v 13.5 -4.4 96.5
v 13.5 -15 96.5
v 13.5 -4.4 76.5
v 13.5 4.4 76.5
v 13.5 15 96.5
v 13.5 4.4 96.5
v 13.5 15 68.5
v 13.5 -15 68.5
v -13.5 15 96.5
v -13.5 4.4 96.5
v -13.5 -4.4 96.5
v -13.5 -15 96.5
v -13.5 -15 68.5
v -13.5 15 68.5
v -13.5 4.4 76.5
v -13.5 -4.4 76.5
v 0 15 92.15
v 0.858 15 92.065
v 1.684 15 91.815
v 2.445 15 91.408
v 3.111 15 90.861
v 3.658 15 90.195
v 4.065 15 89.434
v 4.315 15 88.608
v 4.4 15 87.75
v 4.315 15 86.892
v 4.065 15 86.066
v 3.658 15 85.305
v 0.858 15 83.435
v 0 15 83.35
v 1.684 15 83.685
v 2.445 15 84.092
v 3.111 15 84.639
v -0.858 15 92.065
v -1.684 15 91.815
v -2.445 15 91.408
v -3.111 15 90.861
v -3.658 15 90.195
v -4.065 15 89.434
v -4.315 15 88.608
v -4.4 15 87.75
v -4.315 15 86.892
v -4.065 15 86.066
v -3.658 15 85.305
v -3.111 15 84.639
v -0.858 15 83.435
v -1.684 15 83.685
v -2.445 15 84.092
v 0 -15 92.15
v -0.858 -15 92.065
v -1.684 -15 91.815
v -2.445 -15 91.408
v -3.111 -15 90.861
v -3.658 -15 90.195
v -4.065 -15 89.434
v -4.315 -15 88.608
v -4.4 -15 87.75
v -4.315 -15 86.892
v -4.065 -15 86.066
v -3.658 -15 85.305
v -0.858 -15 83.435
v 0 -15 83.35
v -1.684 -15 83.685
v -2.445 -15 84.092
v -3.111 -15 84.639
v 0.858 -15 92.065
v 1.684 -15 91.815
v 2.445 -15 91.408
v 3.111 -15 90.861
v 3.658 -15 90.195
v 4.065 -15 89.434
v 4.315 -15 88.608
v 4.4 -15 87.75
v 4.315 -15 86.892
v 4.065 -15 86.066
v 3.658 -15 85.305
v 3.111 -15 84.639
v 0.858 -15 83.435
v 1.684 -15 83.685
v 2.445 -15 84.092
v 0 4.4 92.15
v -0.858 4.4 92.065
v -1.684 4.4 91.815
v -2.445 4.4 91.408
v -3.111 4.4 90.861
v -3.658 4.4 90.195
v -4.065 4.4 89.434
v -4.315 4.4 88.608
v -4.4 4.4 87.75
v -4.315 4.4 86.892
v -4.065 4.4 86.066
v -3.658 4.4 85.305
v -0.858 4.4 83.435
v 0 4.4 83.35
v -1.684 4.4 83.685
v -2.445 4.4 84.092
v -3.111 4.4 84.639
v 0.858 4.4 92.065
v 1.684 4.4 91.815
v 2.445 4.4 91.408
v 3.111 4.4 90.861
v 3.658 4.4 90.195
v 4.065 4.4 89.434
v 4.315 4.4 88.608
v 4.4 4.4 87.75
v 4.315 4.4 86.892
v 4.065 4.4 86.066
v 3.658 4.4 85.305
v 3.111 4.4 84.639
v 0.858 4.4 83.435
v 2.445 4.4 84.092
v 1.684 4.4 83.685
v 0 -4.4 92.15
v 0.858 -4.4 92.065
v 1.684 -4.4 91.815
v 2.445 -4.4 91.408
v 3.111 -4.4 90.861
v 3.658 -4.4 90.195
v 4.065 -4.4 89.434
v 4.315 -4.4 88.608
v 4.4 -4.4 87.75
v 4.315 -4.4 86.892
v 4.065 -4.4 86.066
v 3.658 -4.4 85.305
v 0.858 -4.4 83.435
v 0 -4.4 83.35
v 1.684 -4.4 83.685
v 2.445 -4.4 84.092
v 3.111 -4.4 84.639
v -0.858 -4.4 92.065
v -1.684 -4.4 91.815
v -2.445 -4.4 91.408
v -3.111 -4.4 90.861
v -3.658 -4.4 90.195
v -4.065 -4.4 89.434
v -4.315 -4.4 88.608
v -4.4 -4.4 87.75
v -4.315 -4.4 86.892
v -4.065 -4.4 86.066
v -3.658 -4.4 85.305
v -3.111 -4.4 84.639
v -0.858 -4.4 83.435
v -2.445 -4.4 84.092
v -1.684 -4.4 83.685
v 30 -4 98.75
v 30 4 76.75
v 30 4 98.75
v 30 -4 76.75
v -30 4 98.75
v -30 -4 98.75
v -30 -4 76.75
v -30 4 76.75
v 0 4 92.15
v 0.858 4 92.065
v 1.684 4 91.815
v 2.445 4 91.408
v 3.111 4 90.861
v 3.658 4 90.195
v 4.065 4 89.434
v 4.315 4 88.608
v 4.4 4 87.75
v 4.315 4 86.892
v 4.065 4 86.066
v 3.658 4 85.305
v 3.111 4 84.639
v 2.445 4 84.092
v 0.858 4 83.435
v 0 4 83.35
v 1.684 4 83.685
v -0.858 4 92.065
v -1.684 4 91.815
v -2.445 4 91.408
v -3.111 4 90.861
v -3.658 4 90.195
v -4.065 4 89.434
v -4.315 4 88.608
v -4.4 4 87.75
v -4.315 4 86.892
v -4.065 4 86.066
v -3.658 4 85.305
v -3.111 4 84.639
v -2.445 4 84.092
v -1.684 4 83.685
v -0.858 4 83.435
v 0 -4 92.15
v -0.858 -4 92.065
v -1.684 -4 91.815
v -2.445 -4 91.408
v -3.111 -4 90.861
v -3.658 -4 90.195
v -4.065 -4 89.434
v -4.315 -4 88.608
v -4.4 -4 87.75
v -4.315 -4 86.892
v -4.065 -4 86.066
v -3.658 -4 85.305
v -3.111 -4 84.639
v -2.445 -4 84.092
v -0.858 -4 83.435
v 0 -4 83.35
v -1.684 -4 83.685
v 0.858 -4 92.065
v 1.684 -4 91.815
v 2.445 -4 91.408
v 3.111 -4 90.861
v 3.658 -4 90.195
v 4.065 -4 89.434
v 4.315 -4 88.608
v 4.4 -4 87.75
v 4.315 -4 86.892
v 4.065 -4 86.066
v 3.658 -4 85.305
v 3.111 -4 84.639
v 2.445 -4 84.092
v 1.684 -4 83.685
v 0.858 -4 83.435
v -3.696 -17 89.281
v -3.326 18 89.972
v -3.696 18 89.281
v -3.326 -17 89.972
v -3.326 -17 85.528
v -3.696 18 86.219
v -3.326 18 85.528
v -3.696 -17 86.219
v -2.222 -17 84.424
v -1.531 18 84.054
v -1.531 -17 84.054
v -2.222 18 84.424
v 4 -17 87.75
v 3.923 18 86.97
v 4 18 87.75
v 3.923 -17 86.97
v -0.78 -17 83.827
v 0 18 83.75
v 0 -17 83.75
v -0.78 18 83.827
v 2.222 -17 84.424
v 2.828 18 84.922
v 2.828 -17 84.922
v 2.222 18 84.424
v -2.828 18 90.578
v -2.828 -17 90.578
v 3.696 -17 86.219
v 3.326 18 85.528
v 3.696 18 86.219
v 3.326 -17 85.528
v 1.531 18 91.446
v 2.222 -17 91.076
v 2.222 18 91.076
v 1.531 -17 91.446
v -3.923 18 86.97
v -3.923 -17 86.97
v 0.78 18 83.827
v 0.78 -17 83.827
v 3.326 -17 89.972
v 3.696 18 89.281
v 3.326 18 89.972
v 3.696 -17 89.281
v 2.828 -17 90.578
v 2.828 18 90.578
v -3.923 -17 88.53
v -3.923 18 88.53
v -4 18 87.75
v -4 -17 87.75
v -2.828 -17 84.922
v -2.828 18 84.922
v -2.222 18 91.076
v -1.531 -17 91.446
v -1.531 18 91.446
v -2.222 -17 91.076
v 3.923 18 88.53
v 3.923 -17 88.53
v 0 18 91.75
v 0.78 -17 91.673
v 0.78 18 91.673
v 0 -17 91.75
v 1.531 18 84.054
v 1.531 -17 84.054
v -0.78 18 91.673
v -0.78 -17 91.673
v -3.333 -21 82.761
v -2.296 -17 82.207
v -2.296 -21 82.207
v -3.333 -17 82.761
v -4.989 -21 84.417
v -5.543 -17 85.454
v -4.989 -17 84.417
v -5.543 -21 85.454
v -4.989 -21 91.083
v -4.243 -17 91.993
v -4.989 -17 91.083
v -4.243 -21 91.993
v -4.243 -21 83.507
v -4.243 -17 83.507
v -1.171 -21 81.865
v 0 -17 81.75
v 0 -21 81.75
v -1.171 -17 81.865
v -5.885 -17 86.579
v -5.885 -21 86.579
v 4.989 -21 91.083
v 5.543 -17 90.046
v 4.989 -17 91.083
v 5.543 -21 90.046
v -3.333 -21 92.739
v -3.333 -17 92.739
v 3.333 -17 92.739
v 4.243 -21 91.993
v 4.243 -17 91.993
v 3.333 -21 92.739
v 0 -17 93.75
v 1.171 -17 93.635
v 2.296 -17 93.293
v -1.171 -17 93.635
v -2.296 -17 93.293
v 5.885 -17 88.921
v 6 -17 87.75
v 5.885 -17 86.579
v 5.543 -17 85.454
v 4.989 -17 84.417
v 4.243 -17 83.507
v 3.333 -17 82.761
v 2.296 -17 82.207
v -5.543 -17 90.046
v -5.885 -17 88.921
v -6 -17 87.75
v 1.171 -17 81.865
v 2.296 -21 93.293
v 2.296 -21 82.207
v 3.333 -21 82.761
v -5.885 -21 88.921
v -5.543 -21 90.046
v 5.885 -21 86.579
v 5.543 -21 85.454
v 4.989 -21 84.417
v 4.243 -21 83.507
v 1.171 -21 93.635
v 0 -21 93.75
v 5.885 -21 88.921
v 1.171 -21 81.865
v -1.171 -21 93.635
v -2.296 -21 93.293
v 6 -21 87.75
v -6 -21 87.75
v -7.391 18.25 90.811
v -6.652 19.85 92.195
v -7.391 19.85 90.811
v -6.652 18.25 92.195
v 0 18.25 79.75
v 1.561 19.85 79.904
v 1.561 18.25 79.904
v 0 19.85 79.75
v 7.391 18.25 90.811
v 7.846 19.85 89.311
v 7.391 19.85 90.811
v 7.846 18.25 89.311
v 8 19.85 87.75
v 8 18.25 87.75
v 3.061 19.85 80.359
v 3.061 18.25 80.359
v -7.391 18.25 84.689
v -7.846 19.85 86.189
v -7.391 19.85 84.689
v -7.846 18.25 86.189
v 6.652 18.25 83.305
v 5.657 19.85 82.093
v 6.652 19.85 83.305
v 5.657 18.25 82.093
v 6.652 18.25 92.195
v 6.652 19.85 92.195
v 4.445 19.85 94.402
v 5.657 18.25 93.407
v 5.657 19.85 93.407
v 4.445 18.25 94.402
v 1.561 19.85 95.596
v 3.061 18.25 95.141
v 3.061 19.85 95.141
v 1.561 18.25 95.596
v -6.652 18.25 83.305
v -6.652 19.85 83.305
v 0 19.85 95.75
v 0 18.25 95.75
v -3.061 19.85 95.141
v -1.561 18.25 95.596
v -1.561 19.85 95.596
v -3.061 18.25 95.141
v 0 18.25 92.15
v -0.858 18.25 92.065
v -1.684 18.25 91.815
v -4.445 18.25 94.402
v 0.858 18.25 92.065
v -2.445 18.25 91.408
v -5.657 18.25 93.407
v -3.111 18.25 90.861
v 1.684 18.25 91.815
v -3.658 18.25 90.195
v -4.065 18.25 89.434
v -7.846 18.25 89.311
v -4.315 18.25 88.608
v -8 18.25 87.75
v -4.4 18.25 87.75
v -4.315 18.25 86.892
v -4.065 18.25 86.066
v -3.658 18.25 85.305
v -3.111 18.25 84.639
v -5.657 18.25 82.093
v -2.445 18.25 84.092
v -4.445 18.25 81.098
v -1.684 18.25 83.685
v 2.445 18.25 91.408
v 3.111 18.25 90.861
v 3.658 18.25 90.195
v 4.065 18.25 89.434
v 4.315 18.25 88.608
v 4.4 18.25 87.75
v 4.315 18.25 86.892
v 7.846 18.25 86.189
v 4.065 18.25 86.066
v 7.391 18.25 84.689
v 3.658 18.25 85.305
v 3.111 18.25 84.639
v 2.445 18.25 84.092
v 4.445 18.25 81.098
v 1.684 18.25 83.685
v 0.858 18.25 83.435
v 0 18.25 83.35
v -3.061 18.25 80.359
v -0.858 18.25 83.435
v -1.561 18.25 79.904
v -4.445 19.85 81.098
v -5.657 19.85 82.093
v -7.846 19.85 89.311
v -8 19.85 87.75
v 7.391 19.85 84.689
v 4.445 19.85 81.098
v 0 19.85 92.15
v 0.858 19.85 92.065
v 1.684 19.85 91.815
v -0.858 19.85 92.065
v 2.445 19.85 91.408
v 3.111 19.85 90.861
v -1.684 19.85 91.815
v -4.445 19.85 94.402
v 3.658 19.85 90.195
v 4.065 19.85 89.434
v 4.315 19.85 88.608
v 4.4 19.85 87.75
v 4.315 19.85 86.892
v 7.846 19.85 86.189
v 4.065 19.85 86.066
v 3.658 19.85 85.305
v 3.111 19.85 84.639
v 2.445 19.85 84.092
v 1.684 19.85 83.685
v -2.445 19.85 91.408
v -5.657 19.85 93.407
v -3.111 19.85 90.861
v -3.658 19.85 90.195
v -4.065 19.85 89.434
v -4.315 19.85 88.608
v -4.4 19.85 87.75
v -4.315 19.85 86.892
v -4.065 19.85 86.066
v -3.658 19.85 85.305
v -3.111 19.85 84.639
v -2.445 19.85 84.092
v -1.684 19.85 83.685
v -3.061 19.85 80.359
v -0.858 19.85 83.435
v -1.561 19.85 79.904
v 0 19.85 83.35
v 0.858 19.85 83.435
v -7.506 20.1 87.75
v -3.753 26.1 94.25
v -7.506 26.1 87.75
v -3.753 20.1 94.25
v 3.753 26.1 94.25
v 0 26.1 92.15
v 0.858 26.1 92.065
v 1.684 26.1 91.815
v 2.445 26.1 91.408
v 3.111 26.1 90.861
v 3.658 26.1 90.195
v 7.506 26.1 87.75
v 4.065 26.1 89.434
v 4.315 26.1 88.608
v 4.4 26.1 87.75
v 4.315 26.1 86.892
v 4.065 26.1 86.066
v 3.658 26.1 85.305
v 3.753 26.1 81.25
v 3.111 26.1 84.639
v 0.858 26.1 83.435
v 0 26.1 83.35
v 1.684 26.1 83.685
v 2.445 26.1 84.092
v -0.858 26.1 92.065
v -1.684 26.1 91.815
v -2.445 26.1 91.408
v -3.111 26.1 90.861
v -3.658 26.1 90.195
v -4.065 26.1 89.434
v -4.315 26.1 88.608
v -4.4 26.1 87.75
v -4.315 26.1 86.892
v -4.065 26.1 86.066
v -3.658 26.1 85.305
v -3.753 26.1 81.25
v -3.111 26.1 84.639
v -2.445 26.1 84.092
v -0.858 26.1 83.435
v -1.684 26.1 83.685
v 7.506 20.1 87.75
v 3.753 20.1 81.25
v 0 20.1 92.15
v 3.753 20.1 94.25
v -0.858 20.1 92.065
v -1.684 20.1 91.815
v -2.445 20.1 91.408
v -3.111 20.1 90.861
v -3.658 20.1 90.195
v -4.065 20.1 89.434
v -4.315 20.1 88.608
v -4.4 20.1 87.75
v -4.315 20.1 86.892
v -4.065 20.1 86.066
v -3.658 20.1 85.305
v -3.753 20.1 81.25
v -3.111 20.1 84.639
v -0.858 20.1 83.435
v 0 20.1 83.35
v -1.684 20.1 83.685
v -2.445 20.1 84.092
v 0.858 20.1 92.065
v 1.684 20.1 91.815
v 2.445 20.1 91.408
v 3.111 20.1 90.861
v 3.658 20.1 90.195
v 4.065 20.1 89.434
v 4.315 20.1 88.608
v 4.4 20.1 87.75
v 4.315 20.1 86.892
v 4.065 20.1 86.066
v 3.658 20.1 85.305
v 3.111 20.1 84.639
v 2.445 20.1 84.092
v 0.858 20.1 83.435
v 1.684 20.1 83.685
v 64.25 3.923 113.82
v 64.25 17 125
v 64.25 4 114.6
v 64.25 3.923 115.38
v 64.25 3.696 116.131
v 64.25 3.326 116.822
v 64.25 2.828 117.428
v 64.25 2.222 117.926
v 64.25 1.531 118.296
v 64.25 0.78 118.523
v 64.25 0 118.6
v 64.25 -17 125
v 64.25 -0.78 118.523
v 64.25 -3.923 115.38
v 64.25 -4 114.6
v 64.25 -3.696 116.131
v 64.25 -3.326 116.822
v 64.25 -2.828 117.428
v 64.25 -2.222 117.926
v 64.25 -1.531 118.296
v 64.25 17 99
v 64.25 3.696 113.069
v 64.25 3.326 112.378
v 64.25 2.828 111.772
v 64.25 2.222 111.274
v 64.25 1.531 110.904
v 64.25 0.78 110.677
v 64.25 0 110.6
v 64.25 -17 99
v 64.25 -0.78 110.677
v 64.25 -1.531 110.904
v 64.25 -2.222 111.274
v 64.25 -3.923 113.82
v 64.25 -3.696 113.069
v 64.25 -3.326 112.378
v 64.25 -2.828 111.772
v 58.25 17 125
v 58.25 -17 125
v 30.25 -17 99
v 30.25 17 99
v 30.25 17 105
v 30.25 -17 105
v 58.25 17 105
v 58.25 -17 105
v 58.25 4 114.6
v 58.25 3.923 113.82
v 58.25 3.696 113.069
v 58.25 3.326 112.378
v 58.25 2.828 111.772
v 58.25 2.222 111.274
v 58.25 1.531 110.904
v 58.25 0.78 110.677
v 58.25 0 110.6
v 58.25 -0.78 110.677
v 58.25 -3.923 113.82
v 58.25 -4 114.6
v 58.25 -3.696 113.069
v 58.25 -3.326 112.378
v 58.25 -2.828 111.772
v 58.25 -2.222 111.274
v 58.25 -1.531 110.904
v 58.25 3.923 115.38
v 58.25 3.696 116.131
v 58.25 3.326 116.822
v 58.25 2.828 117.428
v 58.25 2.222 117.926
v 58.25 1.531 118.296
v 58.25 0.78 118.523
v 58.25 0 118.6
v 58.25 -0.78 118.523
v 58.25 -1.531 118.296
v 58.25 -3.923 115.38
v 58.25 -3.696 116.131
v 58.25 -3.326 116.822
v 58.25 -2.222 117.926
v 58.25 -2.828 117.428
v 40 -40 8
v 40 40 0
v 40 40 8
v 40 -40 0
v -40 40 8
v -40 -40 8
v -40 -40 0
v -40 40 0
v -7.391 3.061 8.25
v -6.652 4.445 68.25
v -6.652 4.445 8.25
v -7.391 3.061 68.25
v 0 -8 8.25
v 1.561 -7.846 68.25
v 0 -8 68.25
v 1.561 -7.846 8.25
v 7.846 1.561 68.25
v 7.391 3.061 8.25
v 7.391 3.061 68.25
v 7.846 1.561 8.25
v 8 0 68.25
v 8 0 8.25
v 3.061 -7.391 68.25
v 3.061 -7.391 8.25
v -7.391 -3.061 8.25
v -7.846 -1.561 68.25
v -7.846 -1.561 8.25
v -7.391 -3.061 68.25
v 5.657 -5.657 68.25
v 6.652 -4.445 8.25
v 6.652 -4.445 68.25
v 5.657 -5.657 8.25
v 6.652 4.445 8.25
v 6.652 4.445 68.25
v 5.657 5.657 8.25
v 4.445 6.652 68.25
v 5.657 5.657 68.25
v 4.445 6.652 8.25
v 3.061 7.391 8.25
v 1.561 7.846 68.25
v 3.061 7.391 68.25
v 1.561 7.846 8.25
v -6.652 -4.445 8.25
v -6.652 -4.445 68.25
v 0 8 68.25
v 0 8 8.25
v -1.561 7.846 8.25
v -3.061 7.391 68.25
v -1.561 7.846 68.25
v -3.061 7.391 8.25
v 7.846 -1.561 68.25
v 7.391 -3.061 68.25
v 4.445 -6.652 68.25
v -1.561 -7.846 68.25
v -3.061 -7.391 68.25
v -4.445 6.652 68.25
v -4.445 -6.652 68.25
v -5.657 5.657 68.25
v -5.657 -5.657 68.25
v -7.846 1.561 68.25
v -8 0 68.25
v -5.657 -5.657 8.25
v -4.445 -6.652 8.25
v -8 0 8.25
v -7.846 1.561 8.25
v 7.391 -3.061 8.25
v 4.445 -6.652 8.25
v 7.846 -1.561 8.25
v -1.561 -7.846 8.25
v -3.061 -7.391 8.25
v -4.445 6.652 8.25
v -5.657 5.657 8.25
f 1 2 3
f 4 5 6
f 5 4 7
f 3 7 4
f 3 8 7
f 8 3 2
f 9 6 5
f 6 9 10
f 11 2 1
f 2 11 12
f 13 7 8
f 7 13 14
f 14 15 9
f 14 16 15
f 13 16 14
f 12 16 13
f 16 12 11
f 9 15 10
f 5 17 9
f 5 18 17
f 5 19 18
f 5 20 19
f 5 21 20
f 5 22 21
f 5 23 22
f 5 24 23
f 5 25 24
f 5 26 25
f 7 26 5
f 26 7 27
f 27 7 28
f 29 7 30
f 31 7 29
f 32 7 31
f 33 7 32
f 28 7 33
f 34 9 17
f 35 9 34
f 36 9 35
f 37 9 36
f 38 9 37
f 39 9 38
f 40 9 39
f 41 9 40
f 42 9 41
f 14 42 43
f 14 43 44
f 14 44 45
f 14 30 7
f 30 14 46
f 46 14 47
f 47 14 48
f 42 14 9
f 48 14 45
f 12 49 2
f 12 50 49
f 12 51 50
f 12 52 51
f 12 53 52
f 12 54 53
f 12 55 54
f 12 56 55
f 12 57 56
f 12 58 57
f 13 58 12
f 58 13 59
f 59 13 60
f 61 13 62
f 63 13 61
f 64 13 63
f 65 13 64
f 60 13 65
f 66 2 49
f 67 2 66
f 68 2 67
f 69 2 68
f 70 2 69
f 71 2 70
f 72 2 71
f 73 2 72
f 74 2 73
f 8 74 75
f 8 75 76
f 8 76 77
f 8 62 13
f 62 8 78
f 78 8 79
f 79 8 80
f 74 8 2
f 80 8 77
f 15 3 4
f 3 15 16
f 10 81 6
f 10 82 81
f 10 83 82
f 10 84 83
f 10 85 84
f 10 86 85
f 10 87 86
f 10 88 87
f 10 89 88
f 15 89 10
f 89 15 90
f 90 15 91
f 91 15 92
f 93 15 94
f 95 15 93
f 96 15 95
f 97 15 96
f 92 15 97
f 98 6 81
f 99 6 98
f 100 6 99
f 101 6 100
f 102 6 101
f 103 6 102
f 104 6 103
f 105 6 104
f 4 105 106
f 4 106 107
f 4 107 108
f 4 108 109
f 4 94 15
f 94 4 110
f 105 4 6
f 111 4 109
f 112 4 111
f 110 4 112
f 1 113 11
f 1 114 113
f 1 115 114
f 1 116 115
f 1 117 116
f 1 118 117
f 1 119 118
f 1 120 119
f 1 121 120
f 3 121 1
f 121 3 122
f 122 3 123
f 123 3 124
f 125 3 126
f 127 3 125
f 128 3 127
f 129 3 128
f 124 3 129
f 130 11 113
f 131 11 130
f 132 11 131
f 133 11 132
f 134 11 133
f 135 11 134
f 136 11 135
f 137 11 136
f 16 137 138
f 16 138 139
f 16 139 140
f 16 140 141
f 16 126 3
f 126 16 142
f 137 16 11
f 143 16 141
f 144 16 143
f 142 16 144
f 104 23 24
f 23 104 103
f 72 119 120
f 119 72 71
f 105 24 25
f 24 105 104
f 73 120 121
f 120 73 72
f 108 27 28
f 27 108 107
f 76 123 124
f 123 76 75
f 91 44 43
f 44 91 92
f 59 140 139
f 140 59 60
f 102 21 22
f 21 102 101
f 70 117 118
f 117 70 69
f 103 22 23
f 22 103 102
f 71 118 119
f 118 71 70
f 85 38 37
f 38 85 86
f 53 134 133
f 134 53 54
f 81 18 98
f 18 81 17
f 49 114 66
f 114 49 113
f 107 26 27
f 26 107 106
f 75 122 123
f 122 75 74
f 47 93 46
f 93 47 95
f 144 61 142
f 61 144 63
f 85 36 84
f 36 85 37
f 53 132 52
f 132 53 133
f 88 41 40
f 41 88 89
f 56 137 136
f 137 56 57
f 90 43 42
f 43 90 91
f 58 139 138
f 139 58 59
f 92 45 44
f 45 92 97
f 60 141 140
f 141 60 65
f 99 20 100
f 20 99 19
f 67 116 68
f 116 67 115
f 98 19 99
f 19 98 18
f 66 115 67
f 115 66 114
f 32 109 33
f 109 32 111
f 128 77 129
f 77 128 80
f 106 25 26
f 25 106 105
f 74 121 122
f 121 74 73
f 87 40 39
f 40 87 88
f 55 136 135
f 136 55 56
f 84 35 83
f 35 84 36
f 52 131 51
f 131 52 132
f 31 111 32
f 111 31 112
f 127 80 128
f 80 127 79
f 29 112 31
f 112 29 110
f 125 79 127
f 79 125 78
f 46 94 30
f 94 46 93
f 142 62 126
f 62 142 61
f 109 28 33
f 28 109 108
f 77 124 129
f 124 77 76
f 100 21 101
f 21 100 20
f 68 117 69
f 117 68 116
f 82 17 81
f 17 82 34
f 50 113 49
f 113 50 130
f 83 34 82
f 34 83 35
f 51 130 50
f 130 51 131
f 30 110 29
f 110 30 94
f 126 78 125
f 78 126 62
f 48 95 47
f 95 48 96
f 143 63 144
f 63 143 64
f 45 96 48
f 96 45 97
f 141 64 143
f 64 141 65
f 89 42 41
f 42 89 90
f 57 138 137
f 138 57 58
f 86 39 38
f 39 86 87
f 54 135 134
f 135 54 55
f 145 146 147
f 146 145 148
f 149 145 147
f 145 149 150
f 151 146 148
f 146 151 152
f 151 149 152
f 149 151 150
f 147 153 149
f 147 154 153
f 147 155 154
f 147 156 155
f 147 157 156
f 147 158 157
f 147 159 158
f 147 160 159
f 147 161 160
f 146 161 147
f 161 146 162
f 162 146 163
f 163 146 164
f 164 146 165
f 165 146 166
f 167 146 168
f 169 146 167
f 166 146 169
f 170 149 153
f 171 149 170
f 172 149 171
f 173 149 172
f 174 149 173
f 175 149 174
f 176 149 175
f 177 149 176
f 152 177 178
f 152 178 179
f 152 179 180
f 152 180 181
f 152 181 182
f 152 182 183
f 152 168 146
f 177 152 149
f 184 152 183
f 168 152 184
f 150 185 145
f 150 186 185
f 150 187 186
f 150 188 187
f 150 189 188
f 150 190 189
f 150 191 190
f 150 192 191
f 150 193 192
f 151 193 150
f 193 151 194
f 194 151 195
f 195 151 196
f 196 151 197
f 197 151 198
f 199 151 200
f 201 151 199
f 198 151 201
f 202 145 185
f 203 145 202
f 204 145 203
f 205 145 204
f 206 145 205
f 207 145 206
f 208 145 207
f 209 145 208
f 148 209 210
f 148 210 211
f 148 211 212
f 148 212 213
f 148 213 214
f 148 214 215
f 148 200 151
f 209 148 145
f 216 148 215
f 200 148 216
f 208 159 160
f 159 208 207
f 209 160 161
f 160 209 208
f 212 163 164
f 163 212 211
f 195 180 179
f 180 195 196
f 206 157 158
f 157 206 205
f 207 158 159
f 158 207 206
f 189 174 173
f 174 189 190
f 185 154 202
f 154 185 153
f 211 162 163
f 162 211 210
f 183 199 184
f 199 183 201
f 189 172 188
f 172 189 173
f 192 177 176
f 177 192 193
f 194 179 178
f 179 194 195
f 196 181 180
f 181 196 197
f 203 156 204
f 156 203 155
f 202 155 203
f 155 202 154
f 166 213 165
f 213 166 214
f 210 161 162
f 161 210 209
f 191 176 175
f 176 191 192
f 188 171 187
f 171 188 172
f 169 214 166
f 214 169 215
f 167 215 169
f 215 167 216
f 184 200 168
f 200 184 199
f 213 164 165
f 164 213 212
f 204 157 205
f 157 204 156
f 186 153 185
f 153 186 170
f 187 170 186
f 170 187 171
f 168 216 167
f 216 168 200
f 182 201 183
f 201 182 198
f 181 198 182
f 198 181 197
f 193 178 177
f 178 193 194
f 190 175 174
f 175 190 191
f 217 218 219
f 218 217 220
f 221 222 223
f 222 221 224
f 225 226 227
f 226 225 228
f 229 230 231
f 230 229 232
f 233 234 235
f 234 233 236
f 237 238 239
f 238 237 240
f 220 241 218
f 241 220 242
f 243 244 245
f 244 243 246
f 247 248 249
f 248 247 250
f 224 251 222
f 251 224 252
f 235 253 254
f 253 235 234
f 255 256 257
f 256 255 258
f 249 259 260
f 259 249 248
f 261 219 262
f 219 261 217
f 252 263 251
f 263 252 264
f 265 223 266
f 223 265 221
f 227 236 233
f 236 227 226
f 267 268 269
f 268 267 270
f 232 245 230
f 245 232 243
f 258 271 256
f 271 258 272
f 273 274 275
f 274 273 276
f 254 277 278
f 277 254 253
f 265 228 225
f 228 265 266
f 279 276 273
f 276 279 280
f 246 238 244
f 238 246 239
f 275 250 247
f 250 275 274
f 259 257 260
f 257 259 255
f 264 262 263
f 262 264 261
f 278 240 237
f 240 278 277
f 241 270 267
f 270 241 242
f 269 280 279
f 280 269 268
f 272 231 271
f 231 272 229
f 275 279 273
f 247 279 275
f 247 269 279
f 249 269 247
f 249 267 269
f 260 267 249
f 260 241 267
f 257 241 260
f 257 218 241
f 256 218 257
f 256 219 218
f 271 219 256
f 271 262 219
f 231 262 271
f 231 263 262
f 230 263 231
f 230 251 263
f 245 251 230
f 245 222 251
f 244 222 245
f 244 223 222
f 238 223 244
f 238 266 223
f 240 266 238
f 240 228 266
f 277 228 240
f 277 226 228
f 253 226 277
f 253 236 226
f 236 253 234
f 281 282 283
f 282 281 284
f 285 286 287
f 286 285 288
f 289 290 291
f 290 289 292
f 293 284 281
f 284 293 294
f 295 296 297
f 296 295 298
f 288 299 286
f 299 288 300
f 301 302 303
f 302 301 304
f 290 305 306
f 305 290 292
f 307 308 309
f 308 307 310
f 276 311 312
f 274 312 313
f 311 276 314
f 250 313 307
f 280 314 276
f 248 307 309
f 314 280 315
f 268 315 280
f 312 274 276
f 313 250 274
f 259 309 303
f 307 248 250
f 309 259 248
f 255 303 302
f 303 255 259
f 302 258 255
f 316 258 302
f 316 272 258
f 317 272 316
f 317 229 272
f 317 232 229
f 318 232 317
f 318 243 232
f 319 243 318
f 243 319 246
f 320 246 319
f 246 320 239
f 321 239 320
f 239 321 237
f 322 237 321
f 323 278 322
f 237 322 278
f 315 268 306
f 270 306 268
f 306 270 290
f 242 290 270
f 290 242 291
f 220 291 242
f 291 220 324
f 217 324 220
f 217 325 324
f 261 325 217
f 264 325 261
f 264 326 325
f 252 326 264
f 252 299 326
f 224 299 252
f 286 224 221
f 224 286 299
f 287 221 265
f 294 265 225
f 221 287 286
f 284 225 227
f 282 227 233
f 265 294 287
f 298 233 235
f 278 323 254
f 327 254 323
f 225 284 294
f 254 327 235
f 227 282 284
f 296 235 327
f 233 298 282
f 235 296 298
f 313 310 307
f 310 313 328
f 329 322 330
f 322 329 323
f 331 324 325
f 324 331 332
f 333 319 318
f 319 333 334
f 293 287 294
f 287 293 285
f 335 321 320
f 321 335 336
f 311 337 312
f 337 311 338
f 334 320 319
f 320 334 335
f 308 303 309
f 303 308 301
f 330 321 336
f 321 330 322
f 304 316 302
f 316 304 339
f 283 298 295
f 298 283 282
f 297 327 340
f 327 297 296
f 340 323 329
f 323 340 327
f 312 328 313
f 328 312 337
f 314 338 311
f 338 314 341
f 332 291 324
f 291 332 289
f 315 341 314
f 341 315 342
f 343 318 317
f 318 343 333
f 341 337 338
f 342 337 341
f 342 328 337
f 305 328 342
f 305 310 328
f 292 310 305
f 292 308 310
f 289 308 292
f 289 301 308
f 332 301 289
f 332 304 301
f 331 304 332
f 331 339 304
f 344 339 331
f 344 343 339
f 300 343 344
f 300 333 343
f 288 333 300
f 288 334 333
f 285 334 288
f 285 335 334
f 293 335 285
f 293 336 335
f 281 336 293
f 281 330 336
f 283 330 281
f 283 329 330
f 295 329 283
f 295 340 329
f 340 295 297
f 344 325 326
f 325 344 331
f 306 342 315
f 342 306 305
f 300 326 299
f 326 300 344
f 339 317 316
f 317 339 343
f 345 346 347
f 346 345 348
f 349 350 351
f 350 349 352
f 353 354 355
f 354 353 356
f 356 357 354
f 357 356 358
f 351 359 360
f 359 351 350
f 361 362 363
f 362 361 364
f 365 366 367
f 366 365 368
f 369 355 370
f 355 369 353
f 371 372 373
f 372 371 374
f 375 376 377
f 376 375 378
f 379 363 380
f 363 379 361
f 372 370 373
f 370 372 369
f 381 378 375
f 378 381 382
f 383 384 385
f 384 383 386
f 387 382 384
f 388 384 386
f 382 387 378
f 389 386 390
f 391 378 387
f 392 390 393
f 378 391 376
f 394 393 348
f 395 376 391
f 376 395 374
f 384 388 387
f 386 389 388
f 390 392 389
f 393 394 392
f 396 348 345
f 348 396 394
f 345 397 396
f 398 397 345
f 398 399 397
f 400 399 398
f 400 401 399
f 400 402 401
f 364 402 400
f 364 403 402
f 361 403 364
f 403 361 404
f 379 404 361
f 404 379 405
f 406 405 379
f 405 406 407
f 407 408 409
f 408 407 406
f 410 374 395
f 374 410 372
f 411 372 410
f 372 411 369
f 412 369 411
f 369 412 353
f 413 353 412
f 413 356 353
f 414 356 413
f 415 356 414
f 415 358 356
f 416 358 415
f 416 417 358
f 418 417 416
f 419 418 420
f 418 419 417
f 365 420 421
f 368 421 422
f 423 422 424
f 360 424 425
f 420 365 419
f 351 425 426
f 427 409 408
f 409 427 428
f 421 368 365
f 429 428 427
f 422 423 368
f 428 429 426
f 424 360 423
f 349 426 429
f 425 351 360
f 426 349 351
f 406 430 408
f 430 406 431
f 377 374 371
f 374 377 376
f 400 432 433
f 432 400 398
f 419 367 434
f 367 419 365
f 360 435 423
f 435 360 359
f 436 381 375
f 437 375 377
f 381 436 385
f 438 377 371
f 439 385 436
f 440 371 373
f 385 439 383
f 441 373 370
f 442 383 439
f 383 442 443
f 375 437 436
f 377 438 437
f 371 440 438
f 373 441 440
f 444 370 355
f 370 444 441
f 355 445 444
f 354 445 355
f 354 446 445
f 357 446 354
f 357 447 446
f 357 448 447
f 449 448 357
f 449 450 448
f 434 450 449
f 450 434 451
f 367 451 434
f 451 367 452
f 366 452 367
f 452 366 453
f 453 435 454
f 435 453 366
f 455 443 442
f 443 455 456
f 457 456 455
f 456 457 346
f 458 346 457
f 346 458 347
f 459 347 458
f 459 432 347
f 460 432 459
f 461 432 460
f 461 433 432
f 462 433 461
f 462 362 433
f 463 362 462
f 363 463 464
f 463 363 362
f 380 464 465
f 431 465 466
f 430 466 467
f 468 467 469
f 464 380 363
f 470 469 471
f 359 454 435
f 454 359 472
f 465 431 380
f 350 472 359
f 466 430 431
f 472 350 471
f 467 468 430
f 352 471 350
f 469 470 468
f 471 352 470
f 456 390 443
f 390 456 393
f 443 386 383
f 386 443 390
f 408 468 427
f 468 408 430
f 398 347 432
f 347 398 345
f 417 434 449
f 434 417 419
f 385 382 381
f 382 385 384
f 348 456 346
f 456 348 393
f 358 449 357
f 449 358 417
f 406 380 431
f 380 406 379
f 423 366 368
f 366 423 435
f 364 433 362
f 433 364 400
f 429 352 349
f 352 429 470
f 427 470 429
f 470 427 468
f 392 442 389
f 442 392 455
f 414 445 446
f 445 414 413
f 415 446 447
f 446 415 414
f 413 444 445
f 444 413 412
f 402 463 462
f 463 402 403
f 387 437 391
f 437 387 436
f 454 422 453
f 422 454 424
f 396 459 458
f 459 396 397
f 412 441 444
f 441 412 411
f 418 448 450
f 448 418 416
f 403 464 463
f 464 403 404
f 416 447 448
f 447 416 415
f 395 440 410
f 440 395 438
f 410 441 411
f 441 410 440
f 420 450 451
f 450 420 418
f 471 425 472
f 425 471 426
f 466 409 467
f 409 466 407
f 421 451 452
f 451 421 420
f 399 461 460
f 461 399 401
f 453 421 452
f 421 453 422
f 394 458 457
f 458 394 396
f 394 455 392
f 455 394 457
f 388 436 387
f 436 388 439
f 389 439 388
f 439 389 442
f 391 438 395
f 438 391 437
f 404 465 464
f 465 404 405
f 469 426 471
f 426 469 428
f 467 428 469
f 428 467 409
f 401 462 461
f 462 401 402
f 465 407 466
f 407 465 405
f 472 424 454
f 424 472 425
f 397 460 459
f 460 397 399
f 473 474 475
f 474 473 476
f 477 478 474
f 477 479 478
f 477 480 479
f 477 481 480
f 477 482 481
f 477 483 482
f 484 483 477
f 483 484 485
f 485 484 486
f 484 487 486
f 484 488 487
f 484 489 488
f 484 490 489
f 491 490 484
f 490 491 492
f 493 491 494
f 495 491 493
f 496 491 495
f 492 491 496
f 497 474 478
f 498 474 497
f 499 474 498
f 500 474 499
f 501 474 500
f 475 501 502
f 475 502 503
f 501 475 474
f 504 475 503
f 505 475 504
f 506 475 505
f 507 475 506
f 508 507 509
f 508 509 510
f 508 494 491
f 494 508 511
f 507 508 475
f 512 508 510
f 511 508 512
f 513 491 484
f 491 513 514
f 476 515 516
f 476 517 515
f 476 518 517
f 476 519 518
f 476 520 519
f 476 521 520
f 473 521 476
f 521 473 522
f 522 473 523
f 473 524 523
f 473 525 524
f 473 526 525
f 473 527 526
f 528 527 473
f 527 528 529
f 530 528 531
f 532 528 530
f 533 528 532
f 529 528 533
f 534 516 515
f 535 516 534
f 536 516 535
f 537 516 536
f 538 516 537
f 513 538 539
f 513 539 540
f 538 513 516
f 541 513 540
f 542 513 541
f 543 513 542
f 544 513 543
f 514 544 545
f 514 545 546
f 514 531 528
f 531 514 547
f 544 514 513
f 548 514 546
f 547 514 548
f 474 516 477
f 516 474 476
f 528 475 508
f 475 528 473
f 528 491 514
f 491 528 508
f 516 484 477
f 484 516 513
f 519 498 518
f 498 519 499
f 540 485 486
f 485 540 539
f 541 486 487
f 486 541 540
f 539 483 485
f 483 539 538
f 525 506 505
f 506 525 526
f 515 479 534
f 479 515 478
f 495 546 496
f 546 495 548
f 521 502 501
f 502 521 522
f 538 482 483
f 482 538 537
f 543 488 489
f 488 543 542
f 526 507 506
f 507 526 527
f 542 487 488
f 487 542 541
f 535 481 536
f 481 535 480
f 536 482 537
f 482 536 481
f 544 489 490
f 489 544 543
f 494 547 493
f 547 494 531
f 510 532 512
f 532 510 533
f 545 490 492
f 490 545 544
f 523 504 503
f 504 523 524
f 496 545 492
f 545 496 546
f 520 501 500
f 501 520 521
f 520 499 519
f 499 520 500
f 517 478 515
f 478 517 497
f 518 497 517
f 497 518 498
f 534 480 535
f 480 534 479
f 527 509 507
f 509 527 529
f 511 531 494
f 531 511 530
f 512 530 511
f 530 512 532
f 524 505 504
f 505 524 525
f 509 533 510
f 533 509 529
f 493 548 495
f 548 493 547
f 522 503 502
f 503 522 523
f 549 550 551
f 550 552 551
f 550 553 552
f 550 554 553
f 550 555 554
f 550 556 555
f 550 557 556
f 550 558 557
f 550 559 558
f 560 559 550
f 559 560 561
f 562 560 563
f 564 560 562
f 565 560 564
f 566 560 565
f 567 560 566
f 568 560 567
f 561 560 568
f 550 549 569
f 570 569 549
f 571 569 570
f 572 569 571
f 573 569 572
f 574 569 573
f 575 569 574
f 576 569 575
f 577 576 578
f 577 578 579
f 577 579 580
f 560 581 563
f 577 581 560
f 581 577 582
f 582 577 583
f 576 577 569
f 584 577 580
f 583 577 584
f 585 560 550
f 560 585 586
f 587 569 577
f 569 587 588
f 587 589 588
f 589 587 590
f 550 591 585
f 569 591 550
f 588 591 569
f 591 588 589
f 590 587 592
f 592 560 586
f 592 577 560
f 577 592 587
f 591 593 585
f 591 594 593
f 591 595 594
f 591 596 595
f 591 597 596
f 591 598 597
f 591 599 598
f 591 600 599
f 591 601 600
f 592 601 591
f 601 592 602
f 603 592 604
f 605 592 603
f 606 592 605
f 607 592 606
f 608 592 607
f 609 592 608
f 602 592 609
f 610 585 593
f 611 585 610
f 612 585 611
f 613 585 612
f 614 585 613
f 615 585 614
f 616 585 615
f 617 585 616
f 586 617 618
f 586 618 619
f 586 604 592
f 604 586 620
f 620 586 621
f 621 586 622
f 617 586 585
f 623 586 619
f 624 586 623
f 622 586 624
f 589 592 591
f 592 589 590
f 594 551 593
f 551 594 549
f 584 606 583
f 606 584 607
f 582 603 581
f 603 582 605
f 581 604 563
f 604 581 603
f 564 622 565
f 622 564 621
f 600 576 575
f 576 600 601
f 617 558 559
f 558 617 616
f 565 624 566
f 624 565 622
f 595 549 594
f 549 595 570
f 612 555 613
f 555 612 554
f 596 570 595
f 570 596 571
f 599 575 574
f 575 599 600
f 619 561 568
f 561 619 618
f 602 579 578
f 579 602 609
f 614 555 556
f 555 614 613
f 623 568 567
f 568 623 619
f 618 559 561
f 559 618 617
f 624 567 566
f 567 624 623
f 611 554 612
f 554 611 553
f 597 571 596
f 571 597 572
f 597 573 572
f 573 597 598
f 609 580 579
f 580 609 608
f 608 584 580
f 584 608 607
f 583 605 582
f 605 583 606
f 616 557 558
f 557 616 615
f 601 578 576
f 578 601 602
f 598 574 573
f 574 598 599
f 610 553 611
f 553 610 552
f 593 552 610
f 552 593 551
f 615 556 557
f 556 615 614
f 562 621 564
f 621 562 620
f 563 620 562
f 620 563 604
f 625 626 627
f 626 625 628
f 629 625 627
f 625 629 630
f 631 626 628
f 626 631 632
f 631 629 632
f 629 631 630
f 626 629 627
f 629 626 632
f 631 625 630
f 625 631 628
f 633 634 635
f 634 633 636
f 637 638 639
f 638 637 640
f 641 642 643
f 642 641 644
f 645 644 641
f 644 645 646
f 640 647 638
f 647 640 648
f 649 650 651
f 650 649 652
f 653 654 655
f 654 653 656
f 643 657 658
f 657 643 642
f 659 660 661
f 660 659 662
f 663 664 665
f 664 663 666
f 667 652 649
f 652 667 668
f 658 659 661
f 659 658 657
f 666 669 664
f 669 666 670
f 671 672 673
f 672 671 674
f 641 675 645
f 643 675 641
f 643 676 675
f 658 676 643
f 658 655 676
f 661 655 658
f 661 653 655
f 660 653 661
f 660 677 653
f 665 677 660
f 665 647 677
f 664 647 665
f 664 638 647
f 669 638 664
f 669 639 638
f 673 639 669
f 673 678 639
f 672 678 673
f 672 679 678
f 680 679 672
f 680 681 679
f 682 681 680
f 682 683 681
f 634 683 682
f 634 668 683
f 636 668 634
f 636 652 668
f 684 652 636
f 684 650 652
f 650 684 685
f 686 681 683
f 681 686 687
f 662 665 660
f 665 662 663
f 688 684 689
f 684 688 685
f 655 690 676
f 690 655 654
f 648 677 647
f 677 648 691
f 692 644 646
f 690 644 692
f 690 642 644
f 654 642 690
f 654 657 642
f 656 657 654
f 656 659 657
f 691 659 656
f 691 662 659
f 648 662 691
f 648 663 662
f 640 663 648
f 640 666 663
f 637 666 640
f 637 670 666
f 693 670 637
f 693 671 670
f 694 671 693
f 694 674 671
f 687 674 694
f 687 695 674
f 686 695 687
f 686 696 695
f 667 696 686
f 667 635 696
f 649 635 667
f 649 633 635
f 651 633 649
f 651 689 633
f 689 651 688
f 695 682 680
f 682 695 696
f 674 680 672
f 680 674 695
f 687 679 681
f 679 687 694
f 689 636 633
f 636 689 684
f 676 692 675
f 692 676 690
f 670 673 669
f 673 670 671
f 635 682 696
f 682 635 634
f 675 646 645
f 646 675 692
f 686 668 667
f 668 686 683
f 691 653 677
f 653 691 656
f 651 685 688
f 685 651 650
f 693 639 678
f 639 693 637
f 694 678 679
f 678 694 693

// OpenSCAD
$fn = 32;

// ------------------------------------------------------------------------
// Lamp arm: column d16 x 60 mm, arm 60 mm
// Every part is its own module, assembly() places every instance.
// ------------------------------------------------------------------------

// --- part 1 ---
module lamp_base() {
  difference() {
    translate([-40, -40, 0]) cube([80, 80, 8]);
  }
}

// --- part 2 ---
module lamp_column() {
  cylinder(h = 60, d = 16);
}

// --- part 3 ---
module head_fork() {
  difference() {
    translate([-13.5, -15, 0]) cube([27, 30, 28]);
    translate([-14.5, -4.4, 8]) cube([29, 8.8, 21]);
    translate([0, 0, 19.25]) rotate([90, 0, 0]) cylinder(h = 32, d = 8.8, center = true);
  }
}

// --- part 4 ---
module lamp_arm() {
  difference() {
    translate([-30, -4, 0]) cube([60, 8, 22]);
    translate([0, 0, 11]) rotate([90, 0, 0]) cylinder(h = 10, d = 8.8, center = true);
  }
}

// --- part 5 ---
module arm_pin() {
  rotate([0, 90, 0]) cylinder(h = 36, d = 8, center = true);
  translate([-21, 0, 0]) rotate([0, 90, 0]) cylinder(h = 4, d = 12);
}

// --- part 6 ---
module arm_washer() {
  difference() {
      translate([0, 0, 0]) cylinder(h = 1.6, d = 16);
      translate([0, 0, -1]) cylinder(h = 3.6, d = 8.8);
    }
}

// --- part 7 ---
module arm_nut() {
  difference() {
    linear_extrude(height = 6) polygon(points = [[7.506, 0], [3.753, 6.5], [-3.753, 6.5], [-7.506, 0], [-3.753, -6.5], [3.753, -6.5]]);
    translate([0, 0, -1]) cylinder(h = 8, d = 8.8);
  }
}

// --- part 8 ---
module shade_bracket() {
  difference() {
    translate([-17, -17, 0]) cube([34, 34, 26]);
    translate([-18, -18, 6]) cube([29, 36, 21]);
    translate([14, 0, 15.6]) rotate([0, 90, 0]) cylinder(h = 8, d = 8, center = true);
  }
}

// --- assembly ---
module assembly() {
  color([0.80, 0.24, 0.20]) translate([0, 0, 0]) rotate([0, 0, 0]) lamp_base();
  color([0.20, 0.45, 0.75]) translate([0, 0, 8.25]) rotate([0, 0, 0]) lamp_column();
  color([0.25, 0.62, 0.32]) translate([0, 0, 68.5]) rotate([0, 0, 0]) head_fork();
  color([0.92, 0.70, 0.18]) translate([0, 0, 76.75]) rotate([0, 0, 0]) lamp_arm();
  color([0.58, 0.35, 0.70]) translate([0, 0, 87.75]) rotate([0, 0, 90]) arm_pin();
  color([0.16, 0.66, 0.66]) translate([0, 19.85, 87.75]) rotate([90, 0, 0]) arm_washer();
  color([0.85, 0.48, 0.18]) translate([0, 26.1, 87.75]) rotate([90, 0, 0]) arm_nut();
  color([0.55, 0.60, 0.65]) translate([47.25, 0, 99]) rotate([0, 0, 0]) shade_bracket();
}

assembly();
